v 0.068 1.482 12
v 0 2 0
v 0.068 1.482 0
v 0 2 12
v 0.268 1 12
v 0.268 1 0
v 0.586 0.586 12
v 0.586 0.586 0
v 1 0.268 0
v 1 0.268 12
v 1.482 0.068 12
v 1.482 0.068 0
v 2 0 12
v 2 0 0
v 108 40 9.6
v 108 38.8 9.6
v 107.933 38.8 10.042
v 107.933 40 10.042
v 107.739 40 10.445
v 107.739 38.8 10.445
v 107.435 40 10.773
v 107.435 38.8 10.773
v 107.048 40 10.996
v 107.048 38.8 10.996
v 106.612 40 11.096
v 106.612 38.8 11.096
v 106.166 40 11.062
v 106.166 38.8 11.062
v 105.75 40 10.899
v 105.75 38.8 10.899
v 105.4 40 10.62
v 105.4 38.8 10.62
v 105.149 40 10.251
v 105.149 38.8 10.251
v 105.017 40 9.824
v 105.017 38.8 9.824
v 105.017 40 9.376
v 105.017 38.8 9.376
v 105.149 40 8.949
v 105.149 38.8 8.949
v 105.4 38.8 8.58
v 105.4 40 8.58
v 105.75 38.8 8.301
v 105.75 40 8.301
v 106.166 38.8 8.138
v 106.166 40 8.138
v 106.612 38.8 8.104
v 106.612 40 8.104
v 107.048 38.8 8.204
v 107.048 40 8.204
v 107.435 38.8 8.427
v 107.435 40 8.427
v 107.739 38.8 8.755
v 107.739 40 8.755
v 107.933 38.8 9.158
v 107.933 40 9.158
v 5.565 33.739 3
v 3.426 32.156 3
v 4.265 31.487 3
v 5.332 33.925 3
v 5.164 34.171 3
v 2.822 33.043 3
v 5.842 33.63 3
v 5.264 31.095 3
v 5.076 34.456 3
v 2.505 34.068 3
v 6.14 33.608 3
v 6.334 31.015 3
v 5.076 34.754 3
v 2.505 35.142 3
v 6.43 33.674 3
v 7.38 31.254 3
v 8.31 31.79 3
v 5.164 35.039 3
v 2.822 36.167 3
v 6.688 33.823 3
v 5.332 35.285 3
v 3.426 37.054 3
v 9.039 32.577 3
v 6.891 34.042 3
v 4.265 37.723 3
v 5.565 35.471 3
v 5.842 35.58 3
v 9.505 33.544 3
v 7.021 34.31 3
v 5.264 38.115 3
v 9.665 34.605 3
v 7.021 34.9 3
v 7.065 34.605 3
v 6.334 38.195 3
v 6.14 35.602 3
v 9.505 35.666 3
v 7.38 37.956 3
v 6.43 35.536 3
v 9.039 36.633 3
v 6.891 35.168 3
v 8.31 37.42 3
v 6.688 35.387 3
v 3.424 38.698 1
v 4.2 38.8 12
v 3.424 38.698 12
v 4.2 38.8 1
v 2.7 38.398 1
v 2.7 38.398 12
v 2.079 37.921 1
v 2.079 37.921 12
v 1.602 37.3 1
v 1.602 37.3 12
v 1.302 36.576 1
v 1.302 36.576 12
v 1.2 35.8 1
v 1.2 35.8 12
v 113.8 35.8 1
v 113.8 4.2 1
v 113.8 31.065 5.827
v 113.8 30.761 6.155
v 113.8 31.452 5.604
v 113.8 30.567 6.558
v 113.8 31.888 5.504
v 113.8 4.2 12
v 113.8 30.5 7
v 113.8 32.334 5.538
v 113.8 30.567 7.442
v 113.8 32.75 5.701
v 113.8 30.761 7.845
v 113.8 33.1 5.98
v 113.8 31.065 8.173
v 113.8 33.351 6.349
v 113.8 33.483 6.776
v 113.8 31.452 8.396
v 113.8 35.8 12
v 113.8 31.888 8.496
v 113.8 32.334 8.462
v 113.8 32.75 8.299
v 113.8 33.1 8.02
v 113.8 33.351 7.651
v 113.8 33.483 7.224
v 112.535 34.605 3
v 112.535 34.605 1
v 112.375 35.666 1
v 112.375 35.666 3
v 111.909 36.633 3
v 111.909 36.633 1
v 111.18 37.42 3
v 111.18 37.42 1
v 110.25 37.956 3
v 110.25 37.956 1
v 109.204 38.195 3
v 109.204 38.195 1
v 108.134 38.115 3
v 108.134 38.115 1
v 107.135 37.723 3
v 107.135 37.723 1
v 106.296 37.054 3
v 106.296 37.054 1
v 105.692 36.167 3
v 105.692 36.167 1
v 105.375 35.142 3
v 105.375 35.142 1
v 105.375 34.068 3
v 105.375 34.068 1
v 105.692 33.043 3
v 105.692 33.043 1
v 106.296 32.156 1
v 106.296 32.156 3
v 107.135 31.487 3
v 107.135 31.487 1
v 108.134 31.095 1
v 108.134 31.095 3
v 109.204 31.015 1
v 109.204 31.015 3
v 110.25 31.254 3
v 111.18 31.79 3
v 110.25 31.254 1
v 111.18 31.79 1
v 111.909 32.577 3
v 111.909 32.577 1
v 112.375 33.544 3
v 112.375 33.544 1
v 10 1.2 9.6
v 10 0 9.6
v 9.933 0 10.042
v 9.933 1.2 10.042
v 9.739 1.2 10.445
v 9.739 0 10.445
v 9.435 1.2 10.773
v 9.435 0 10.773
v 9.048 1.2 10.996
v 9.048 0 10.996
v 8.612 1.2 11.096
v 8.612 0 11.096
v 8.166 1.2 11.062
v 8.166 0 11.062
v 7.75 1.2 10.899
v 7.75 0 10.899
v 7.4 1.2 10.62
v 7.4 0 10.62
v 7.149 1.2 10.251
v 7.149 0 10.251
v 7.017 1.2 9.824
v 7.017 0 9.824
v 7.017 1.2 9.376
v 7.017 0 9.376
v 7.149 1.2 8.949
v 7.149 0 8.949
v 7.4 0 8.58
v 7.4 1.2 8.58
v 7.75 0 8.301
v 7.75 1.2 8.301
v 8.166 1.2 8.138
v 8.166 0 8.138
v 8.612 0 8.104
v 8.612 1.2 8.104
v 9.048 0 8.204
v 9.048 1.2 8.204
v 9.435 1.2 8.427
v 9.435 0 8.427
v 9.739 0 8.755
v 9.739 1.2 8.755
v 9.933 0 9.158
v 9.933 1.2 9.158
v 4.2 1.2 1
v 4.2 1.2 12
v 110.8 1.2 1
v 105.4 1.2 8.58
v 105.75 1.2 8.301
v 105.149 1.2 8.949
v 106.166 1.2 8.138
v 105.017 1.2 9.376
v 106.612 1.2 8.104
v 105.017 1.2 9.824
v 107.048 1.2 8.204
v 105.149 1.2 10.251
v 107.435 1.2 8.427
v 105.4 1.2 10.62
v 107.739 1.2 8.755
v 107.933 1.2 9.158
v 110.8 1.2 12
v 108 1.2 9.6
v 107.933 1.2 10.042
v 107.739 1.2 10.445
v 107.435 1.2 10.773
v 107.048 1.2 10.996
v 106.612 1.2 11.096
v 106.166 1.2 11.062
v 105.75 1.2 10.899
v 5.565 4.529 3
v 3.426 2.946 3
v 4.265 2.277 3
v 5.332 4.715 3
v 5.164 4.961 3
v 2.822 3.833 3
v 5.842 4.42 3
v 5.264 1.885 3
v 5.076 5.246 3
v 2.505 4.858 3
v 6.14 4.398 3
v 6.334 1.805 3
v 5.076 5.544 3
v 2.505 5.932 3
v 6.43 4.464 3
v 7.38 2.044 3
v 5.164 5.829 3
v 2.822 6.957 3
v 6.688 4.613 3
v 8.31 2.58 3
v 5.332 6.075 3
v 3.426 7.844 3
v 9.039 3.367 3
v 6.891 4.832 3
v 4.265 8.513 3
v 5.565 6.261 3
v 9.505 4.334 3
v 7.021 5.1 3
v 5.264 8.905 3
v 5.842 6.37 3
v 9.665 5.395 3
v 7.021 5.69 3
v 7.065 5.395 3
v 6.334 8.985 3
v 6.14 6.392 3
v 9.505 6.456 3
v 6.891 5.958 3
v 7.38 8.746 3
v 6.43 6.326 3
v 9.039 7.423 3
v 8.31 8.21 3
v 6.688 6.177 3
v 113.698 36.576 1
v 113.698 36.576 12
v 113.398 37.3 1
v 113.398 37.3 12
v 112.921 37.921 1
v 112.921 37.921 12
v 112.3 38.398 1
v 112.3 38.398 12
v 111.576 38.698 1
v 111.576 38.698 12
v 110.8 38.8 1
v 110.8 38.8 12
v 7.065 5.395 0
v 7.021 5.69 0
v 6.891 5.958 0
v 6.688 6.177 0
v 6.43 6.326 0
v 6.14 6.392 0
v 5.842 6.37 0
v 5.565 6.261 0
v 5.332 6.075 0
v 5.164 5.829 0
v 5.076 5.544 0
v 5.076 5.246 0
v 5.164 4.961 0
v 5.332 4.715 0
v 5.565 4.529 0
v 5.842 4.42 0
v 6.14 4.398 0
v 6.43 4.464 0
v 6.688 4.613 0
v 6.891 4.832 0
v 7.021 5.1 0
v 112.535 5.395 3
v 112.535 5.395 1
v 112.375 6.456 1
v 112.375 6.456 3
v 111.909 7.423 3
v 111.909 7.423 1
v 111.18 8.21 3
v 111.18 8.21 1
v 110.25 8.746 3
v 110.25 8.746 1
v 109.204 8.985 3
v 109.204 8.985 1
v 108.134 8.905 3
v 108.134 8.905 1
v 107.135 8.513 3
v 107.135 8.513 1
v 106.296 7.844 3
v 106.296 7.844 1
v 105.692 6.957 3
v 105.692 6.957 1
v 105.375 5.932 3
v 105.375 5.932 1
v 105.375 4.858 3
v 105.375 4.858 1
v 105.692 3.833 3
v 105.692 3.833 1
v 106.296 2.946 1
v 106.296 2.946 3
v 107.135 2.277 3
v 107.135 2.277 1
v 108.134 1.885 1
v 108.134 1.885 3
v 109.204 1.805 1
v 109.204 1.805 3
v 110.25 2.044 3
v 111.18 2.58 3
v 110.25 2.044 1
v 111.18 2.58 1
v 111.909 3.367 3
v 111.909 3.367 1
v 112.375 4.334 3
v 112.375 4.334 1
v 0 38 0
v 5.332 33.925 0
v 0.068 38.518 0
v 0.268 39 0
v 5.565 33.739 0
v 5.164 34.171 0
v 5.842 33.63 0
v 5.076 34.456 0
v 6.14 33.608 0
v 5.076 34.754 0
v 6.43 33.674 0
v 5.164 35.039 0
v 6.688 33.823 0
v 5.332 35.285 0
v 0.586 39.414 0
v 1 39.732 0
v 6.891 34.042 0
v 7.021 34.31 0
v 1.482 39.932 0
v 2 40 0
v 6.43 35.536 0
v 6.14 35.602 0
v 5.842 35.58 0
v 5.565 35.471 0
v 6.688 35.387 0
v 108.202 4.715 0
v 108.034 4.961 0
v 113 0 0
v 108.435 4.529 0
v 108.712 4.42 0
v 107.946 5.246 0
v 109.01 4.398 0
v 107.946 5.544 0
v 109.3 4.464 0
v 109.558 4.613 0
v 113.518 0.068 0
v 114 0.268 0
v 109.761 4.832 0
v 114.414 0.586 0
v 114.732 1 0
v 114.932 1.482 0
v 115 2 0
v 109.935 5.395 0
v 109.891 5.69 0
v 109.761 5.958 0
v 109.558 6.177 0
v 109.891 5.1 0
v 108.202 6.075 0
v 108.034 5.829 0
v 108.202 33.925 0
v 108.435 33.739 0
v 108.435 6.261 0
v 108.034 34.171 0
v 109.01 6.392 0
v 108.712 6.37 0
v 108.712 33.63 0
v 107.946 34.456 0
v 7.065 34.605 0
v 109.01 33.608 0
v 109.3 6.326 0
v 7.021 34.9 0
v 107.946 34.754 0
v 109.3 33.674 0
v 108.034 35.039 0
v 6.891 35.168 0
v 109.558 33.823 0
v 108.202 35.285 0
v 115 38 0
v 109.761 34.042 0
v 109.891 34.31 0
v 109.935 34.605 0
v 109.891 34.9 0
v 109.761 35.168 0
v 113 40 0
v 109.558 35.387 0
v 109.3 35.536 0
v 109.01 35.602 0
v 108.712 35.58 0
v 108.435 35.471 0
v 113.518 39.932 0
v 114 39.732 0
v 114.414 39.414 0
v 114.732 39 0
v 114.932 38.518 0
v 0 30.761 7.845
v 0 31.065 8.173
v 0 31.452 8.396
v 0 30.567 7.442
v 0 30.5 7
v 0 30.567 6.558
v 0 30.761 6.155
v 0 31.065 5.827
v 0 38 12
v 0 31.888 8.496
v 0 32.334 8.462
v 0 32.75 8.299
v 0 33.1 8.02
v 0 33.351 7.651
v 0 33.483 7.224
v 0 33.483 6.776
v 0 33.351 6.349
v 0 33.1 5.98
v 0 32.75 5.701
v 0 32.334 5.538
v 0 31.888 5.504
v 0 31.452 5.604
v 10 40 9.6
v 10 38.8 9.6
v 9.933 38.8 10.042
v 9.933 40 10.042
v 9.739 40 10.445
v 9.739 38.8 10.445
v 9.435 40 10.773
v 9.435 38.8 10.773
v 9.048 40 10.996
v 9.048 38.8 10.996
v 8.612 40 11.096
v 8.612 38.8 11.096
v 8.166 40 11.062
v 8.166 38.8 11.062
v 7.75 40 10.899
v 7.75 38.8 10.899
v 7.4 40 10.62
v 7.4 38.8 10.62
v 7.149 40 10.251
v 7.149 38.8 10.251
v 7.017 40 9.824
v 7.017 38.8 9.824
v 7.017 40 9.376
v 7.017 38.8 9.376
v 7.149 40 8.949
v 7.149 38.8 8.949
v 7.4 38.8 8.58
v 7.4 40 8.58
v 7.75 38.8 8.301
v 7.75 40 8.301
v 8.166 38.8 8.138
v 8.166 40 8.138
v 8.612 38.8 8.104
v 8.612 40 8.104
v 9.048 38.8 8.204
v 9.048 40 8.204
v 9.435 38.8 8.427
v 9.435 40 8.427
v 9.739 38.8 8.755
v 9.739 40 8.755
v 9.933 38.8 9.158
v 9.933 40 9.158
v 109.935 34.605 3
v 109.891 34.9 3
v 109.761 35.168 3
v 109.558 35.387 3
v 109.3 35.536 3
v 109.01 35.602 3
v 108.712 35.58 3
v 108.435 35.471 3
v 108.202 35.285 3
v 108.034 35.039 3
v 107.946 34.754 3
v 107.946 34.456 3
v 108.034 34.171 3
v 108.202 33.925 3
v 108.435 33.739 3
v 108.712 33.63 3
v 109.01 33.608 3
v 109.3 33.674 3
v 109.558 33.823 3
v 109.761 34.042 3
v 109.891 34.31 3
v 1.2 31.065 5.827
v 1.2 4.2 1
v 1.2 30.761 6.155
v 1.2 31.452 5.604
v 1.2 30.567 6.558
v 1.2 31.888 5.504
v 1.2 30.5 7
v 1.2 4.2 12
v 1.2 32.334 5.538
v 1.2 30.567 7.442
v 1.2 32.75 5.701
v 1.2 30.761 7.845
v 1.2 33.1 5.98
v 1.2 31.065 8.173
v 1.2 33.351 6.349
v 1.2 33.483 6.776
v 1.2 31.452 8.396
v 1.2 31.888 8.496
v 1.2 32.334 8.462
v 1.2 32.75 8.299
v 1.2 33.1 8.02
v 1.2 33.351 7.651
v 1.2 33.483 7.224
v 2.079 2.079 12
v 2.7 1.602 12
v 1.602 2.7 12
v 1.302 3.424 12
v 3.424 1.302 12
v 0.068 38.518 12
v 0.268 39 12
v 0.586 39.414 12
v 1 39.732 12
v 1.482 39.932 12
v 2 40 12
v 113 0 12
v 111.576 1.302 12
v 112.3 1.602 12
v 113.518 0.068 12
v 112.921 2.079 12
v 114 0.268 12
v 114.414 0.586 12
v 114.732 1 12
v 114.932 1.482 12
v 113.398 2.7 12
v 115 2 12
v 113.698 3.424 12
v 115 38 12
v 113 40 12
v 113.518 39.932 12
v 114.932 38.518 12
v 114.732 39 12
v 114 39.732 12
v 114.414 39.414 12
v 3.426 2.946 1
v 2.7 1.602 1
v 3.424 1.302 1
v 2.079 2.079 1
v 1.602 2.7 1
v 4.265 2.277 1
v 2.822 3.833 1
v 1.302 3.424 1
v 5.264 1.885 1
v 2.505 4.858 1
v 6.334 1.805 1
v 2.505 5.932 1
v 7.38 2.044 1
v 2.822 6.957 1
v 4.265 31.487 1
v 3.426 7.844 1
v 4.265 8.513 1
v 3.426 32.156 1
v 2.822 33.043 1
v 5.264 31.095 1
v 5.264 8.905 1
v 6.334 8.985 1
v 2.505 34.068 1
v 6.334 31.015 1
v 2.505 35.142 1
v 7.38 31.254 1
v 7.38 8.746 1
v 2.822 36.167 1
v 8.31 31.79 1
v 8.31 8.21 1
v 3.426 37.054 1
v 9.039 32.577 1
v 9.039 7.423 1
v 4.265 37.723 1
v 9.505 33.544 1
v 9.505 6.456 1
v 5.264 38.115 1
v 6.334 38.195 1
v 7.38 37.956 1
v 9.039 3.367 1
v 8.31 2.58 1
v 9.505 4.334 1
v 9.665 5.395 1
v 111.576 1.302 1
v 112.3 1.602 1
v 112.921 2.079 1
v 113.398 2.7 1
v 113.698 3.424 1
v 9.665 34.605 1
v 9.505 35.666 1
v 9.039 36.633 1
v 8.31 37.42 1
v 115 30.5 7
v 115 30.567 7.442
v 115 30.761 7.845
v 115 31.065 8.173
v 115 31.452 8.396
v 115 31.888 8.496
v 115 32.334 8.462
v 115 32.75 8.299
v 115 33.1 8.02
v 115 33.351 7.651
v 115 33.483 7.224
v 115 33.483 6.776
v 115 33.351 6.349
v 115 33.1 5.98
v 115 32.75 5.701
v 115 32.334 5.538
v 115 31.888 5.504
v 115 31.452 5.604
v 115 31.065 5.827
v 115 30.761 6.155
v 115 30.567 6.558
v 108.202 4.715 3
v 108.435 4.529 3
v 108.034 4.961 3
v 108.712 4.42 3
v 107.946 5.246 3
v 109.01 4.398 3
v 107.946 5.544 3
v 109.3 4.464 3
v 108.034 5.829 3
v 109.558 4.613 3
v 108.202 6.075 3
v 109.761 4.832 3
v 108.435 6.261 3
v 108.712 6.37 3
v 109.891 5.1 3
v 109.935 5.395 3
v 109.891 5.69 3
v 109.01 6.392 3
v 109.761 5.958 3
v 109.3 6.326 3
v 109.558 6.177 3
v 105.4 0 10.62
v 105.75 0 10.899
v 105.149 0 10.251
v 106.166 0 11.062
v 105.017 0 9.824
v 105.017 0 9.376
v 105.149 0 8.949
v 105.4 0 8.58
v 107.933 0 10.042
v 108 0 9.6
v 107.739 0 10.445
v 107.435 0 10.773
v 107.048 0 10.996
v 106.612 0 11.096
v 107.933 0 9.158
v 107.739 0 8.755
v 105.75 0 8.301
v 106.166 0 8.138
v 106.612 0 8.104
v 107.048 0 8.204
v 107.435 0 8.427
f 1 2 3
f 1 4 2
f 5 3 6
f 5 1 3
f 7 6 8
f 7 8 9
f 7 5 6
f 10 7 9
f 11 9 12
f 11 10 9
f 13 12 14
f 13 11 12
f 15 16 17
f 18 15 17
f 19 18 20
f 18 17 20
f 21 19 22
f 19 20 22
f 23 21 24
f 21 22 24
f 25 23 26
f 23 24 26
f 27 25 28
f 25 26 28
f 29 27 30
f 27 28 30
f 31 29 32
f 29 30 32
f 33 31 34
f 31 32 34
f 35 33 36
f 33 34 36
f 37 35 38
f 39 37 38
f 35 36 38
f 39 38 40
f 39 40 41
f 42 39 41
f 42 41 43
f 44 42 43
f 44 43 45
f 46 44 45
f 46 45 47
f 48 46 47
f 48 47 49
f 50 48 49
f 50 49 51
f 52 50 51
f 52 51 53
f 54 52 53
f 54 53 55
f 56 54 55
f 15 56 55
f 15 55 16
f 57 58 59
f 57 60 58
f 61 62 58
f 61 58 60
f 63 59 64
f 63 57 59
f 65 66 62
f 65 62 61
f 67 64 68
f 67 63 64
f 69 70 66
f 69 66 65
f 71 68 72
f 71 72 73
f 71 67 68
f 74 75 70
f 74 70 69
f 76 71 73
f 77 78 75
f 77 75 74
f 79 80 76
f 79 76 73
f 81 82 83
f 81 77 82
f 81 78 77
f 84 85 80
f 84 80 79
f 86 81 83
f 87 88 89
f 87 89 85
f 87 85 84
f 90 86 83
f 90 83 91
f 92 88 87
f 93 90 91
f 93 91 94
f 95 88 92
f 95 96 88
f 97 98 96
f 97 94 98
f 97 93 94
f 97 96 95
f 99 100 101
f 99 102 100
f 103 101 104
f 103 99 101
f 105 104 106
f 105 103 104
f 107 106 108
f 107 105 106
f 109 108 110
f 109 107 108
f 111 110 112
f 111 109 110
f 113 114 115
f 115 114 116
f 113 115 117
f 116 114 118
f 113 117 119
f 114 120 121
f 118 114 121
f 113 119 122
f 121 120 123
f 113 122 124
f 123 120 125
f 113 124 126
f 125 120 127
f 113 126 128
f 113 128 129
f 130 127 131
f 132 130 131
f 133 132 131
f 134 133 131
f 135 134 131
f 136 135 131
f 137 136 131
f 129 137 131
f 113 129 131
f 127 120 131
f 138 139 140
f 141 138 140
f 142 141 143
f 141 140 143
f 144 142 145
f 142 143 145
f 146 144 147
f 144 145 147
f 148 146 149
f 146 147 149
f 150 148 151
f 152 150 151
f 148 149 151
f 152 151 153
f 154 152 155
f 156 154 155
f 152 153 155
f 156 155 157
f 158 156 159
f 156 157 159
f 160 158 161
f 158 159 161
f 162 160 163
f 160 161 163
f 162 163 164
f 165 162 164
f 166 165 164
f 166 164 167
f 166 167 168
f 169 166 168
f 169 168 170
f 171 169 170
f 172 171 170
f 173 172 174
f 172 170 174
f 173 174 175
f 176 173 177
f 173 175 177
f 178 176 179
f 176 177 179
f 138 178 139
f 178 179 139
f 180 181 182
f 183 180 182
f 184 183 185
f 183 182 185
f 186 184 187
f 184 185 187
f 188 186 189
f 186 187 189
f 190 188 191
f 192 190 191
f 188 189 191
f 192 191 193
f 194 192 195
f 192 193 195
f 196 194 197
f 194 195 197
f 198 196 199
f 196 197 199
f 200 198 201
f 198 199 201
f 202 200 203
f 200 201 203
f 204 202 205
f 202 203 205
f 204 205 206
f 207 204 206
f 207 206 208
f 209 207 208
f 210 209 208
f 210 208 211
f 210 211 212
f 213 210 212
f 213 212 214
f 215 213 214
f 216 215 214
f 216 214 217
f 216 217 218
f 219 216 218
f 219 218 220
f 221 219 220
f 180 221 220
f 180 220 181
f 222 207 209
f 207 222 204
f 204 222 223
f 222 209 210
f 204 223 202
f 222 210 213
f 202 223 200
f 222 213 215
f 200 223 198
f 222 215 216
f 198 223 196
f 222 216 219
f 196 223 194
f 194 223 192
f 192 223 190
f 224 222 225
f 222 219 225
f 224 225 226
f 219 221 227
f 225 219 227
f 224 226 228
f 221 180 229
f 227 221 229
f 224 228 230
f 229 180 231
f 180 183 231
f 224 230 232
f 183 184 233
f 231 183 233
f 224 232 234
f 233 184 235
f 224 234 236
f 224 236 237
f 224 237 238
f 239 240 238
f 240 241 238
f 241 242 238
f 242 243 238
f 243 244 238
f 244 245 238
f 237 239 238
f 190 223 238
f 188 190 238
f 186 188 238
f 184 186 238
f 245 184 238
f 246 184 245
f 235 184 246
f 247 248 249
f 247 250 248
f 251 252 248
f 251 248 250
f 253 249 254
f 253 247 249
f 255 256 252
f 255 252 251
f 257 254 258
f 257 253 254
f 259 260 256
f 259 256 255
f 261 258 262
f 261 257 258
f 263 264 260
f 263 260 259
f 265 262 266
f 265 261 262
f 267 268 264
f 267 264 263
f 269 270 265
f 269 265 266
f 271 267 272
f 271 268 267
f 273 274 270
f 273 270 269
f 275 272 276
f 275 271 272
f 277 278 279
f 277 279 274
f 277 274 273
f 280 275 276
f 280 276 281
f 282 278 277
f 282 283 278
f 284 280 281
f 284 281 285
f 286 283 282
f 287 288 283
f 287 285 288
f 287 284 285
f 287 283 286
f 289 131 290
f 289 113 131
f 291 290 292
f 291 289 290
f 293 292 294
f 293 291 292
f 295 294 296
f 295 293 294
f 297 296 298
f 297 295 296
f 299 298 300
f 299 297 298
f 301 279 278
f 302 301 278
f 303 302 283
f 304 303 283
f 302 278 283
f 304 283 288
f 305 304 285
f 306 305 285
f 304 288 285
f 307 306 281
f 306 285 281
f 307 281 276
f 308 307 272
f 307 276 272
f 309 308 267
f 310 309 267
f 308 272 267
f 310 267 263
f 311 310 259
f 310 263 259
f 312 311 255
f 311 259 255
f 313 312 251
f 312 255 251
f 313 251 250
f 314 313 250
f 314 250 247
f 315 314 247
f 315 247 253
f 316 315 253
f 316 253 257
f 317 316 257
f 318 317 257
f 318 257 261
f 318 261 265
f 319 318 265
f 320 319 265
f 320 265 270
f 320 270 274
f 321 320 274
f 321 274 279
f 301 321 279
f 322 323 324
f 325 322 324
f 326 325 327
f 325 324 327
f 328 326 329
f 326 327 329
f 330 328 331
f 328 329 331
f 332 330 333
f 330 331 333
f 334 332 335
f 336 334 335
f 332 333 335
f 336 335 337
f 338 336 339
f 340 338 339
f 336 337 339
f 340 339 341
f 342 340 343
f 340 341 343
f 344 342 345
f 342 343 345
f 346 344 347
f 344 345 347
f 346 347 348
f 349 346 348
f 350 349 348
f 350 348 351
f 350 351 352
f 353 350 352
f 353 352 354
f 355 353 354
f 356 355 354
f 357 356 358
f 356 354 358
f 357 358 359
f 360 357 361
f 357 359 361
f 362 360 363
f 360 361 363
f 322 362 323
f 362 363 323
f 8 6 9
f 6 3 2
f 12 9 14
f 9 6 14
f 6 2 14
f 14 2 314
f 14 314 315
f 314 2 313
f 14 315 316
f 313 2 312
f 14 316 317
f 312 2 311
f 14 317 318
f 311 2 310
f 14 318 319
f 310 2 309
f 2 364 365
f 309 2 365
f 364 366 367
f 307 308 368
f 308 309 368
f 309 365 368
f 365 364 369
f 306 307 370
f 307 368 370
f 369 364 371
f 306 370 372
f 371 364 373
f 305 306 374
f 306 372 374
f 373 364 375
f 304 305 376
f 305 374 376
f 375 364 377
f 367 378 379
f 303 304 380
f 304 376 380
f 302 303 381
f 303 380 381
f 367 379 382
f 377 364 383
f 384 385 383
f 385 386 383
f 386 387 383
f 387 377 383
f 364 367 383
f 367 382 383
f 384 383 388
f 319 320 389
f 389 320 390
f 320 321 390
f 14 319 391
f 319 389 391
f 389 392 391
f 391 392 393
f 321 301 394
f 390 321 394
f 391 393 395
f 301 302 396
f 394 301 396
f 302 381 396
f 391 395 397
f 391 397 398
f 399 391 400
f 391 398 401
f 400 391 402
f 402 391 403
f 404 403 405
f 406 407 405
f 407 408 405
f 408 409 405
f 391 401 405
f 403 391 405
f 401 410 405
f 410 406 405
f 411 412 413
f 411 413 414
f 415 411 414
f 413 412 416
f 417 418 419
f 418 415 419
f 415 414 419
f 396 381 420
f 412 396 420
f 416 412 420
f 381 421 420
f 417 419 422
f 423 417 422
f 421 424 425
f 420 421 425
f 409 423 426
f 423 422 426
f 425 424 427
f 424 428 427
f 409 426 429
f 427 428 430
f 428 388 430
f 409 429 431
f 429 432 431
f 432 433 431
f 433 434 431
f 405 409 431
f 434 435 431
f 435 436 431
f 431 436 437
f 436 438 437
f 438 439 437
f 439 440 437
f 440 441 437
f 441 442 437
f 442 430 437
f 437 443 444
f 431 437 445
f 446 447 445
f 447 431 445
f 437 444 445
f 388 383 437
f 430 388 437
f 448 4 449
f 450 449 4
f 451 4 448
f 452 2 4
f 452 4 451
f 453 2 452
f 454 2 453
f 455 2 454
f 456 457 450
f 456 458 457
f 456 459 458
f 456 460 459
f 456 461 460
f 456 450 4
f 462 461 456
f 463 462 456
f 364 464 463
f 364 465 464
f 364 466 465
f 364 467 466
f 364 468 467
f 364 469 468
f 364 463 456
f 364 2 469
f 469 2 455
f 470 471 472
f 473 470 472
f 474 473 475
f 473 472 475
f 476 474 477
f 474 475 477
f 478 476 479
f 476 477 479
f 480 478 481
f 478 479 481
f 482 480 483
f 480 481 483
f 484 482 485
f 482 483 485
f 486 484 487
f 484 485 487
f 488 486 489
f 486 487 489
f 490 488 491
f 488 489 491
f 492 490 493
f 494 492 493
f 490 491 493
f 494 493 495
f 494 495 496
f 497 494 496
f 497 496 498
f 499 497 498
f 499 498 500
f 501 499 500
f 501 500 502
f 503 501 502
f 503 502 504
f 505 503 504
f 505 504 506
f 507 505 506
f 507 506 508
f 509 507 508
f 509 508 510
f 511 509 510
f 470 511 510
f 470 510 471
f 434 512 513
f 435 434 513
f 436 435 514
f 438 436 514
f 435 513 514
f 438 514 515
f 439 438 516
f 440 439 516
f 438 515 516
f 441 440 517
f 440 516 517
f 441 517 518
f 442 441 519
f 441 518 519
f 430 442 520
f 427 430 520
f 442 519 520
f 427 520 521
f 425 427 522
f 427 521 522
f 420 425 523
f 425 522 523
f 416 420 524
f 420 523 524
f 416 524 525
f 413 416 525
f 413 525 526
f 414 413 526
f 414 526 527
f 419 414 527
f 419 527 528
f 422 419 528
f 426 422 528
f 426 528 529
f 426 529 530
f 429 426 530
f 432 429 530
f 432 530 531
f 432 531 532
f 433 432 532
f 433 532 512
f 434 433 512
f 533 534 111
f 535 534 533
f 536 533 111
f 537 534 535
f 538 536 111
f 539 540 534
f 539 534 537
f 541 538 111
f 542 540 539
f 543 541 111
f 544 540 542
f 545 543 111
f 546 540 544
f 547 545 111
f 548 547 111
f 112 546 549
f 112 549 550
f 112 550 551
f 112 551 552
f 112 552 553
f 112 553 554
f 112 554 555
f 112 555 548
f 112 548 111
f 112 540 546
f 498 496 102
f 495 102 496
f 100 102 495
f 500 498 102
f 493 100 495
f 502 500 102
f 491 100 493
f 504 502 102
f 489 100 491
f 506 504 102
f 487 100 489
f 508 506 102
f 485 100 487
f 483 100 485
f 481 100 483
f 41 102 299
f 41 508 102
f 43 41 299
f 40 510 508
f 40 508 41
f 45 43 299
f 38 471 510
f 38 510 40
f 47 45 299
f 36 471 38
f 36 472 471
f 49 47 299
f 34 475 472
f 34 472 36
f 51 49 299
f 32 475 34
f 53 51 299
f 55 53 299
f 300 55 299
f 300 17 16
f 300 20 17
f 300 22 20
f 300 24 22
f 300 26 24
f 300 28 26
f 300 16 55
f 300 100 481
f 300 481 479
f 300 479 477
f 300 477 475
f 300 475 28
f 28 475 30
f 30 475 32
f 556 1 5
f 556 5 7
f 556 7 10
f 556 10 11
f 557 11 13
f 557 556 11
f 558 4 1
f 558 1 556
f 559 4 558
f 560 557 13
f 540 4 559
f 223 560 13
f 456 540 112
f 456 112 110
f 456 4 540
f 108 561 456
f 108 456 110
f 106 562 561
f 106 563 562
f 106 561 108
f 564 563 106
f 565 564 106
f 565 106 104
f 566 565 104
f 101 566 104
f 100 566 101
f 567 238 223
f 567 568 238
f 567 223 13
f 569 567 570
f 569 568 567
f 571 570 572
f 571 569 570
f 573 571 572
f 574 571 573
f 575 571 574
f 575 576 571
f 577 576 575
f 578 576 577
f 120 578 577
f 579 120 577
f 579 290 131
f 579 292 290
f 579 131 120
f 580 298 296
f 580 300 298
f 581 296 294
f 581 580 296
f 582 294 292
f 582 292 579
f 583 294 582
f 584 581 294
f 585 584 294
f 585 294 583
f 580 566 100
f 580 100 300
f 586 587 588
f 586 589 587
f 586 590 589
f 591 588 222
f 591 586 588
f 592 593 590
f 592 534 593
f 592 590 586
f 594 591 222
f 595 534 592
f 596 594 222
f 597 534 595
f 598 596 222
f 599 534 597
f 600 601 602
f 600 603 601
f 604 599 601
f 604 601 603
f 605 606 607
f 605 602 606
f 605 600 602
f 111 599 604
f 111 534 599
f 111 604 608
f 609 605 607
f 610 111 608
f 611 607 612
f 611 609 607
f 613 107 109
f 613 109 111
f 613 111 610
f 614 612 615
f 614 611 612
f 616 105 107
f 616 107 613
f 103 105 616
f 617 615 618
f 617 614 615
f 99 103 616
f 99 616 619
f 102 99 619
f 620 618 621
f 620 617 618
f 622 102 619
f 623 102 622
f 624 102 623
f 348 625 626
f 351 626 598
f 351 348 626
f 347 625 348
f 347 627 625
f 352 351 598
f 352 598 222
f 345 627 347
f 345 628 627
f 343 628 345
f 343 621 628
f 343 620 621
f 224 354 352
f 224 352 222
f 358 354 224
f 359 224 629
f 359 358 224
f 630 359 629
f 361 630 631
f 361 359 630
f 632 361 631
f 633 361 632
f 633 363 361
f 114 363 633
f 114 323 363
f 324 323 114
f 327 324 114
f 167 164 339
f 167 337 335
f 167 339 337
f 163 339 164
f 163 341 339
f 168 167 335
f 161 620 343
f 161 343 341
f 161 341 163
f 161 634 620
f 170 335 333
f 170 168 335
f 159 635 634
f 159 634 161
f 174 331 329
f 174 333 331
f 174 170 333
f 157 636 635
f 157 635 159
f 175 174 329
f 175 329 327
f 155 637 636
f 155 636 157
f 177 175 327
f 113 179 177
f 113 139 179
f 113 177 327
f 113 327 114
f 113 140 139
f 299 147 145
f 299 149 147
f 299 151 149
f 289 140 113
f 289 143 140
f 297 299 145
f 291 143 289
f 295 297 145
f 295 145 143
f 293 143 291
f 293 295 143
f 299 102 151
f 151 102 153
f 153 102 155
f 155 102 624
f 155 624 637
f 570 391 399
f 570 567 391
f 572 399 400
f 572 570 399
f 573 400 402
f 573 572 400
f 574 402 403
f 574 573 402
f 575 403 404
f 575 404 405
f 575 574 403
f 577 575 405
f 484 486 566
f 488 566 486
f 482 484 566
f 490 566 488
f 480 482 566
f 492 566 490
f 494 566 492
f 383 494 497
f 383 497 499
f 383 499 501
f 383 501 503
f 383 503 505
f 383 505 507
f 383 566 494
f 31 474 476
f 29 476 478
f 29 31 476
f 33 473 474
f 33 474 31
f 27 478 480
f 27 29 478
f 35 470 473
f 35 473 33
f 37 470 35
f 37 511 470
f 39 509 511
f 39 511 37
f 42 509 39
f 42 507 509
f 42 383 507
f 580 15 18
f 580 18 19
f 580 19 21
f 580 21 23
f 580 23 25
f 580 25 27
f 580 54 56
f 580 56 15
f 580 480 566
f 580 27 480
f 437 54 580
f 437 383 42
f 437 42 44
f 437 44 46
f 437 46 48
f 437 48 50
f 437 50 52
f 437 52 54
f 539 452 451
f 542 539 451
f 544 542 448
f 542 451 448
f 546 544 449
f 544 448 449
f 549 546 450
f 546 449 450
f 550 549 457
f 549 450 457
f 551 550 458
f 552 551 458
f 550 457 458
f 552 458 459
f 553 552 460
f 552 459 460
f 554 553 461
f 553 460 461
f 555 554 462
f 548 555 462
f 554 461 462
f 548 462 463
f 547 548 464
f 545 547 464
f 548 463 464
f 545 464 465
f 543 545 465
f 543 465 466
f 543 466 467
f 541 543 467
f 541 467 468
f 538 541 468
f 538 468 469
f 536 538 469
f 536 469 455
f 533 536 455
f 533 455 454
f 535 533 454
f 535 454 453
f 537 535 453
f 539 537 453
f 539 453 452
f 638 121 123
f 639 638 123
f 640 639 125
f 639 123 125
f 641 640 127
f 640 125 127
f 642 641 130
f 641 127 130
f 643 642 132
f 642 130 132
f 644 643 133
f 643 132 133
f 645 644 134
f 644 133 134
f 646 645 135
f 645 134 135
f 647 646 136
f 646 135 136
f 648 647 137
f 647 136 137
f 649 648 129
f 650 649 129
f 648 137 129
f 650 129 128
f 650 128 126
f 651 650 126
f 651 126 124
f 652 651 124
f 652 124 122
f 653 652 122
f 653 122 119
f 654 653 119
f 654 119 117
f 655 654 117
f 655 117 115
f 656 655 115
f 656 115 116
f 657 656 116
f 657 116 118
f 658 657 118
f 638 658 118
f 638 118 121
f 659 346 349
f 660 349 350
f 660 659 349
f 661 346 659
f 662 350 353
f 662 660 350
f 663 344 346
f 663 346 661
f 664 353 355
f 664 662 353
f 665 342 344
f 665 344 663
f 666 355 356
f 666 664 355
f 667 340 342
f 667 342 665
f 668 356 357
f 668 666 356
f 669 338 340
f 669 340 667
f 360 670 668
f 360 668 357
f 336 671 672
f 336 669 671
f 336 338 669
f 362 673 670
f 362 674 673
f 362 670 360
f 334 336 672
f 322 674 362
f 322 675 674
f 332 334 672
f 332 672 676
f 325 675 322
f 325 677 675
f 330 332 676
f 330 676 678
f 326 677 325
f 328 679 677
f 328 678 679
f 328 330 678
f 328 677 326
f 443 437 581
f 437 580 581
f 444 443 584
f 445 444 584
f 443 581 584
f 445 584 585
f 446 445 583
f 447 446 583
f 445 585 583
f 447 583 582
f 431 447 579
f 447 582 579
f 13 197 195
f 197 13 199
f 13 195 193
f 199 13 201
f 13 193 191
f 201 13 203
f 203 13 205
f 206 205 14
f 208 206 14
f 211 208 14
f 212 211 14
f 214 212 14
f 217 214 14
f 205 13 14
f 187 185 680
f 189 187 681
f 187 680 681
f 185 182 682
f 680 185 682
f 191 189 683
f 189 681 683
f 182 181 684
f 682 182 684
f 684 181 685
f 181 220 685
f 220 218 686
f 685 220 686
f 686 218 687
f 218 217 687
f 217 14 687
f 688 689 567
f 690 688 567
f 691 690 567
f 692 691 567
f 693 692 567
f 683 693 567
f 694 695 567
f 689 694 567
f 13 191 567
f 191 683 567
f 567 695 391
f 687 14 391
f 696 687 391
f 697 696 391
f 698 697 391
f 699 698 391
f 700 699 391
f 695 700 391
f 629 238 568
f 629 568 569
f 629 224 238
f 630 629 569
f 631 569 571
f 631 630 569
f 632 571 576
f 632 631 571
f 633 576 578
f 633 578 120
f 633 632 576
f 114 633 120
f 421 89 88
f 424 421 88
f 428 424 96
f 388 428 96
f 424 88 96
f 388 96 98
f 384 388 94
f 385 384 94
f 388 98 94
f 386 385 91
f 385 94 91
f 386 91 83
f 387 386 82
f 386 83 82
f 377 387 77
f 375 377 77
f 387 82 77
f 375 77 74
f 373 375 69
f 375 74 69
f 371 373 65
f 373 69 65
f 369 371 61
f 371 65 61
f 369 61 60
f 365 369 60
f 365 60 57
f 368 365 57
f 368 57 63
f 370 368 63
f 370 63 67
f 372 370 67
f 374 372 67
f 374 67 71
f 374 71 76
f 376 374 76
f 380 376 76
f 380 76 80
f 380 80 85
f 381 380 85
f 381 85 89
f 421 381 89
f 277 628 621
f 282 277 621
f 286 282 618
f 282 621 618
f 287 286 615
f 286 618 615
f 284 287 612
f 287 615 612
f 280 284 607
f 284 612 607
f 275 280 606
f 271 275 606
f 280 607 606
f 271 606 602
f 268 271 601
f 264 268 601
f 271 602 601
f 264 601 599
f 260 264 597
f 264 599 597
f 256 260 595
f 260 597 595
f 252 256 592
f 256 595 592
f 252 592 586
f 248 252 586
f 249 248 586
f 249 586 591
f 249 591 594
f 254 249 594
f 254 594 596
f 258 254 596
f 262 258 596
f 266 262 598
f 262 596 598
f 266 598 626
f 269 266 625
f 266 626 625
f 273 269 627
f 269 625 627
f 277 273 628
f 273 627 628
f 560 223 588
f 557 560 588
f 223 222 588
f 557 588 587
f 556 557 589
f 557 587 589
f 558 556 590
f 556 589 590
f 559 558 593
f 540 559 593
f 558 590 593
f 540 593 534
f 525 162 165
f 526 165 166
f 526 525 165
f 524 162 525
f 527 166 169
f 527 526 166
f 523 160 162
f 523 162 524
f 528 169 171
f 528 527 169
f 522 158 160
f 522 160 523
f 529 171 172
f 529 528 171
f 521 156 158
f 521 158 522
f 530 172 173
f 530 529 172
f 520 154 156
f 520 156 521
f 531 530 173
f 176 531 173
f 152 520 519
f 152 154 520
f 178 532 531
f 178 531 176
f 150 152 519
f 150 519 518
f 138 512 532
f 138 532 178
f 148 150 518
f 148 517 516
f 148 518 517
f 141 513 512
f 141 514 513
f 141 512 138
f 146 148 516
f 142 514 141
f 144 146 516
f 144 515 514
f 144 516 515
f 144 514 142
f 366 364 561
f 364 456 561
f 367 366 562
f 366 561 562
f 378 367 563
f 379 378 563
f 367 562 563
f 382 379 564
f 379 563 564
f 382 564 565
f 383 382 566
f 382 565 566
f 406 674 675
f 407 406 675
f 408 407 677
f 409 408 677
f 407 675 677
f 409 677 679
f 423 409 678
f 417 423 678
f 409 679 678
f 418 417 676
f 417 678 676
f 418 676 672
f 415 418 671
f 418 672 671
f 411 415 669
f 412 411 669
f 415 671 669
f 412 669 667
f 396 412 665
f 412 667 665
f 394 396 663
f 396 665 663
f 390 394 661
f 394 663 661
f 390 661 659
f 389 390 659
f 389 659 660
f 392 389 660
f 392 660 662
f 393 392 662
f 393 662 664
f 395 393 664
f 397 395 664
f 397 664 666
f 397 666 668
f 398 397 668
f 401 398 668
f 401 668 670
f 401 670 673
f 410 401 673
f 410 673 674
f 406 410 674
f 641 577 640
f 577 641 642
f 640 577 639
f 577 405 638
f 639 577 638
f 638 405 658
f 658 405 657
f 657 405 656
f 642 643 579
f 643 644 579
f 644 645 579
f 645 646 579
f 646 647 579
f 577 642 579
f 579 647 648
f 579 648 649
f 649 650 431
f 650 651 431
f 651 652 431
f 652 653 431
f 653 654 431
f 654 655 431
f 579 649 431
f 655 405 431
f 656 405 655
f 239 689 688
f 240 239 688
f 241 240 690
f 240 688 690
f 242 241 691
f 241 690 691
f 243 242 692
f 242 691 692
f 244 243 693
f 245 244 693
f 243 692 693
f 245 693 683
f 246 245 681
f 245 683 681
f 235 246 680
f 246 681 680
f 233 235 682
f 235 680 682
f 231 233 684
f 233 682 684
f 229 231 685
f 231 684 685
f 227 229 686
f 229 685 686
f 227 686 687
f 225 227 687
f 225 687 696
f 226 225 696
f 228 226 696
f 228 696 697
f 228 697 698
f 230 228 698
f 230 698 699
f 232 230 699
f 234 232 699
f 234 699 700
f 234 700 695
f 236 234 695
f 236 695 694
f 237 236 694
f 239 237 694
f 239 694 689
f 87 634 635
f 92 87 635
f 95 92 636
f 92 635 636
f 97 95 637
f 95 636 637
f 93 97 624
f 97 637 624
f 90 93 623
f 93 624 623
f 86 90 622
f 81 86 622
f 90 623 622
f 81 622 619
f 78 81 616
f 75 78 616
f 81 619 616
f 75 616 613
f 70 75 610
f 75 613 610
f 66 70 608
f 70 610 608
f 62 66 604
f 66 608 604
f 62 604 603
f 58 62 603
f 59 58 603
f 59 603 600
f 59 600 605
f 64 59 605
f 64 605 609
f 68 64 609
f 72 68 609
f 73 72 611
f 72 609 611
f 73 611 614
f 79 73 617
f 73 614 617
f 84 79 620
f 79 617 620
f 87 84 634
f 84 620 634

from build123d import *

# Parameters (mm, degrees)
SKETCH_W        = 115
SKETCH_H        = 40
PAD_DEPTH       = 12
SKETCH001_W     = 112.6
SKETCH001_H     = 37.6
POCKET_DEPTH    = 11
SKETCH002_R     = 3.6
PAD001_DEPTH    = 2
SKETCH004_R     = 1.5
POCKET001_DEPTH = 115.001
FILLET_R        = 3
FILLET001_R     = 2
SKETCH011_R     = 1.5
POCKET006_DEPTH = 40.001
SKETCH012_R     = 1
POCKET007_DEPTH = 6


with BuildPart() as part:
    # Sketch → Pad (new body)
    with BuildSketch(Plane.XY):
        with Locations((57.5, 20)):
            Rectangle(SKETCH_W, SKETCH_H)
    extrude(amount=PAD_DEPTH)

    # Sketch001 (on Face6 of Pad) → Pocket (cut)
    with BuildSketch(Plane.XY.offset(12)):
        with Locations((57.5, 20)):
            Rectangle(SKETCH001_W, SKETCH001_H)
    extrude(amount=-POCKET_DEPTH, mode=Mode.SUBTRACT)

    # Sketch002 (on Face11 of Pocket) → Pad001 (join)
    with BuildSketch(Plane.XY.offset(1)):
        with Locations((6.065, 34.605)):
            Circle(SKETCH002_R)
        with Locations((6.065, 5.395)):
            Circle(SKETCH002_R)
        with Locations((108.935, 34.605)):
            Circle(SKETCH002_R)
        with Locations((108.935, 5.395)):
            Circle(SKETCH002_R)
    extrude(amount=PAD001_DEPTH)

    # Sketch004 (on Face2 of Pad001) → Pocket001 (cut, through all)
    with BuildSketch(Plane(origin=(0, 0, 0), x_dir=(0, -1, 0), z_dir=(-1, 0, 0))):
        with Locations((-32, 7)):
            Circle(SKETCH004_R)
    extrude(amount=-POCKET001_DEPTH, mode=Mode.SUBTRACT)

    # Fillet
    fillet_edges = [part.edges().sort_by_distance(p)[0] for p in [
        (1.2, 38.8, 6.5),
        (1.2, 1.2, 6.5),
        (113.8, 1.2, 6.5),
        (113.8, 38.8, 6.5),
    ]]
    fillet(fillet_edges, radius=FILLET_R)

    # Fillet001
    fillet001_edges = [part.edges().sort_by_distance(p)[0] for p in [
        (115, 0, 6),
        (115, 40, 6),
        (0, 40, 6),
        (0, 0, 6),
    ]]
    fillet(fillet001_edges, radius=FILLET001_R)

    # Sketch011 (on Face2 of Fillet001) → Pocket006 (cut, through all)
    with BuildSketch(Plane.XZ):
        with Locations((8.5, 9.6)):
            Circle(SKETCH011_R)
        with Locations((106.5, 9.6)):
            Circle(SKETCH011_R)
    extrude(amount=-POCKET006_DEPTH, mode=Mode.SUBTRACT)

    # Sketch012 (on Face32 of Pocket006) → Pocket007 (cut)
    with BuildSketch(Plane.XY.offset(3)):
        with Locations((6.065, 34.605)):
            Circle(SKETCH012_R)
        with Locations((108.935, 34.605)):
            Circle(SKETCH012_R)
        with Locations((108.935, 5.395)):
            Circle(SKETCH012_R)
        with Locations((6.065, 5.395)):
            Circle(SKETCH012_R)
    extrude(amount=-POCKET007_DEPTH, mode=Mode.SUBTRACT)


solid = part.part
